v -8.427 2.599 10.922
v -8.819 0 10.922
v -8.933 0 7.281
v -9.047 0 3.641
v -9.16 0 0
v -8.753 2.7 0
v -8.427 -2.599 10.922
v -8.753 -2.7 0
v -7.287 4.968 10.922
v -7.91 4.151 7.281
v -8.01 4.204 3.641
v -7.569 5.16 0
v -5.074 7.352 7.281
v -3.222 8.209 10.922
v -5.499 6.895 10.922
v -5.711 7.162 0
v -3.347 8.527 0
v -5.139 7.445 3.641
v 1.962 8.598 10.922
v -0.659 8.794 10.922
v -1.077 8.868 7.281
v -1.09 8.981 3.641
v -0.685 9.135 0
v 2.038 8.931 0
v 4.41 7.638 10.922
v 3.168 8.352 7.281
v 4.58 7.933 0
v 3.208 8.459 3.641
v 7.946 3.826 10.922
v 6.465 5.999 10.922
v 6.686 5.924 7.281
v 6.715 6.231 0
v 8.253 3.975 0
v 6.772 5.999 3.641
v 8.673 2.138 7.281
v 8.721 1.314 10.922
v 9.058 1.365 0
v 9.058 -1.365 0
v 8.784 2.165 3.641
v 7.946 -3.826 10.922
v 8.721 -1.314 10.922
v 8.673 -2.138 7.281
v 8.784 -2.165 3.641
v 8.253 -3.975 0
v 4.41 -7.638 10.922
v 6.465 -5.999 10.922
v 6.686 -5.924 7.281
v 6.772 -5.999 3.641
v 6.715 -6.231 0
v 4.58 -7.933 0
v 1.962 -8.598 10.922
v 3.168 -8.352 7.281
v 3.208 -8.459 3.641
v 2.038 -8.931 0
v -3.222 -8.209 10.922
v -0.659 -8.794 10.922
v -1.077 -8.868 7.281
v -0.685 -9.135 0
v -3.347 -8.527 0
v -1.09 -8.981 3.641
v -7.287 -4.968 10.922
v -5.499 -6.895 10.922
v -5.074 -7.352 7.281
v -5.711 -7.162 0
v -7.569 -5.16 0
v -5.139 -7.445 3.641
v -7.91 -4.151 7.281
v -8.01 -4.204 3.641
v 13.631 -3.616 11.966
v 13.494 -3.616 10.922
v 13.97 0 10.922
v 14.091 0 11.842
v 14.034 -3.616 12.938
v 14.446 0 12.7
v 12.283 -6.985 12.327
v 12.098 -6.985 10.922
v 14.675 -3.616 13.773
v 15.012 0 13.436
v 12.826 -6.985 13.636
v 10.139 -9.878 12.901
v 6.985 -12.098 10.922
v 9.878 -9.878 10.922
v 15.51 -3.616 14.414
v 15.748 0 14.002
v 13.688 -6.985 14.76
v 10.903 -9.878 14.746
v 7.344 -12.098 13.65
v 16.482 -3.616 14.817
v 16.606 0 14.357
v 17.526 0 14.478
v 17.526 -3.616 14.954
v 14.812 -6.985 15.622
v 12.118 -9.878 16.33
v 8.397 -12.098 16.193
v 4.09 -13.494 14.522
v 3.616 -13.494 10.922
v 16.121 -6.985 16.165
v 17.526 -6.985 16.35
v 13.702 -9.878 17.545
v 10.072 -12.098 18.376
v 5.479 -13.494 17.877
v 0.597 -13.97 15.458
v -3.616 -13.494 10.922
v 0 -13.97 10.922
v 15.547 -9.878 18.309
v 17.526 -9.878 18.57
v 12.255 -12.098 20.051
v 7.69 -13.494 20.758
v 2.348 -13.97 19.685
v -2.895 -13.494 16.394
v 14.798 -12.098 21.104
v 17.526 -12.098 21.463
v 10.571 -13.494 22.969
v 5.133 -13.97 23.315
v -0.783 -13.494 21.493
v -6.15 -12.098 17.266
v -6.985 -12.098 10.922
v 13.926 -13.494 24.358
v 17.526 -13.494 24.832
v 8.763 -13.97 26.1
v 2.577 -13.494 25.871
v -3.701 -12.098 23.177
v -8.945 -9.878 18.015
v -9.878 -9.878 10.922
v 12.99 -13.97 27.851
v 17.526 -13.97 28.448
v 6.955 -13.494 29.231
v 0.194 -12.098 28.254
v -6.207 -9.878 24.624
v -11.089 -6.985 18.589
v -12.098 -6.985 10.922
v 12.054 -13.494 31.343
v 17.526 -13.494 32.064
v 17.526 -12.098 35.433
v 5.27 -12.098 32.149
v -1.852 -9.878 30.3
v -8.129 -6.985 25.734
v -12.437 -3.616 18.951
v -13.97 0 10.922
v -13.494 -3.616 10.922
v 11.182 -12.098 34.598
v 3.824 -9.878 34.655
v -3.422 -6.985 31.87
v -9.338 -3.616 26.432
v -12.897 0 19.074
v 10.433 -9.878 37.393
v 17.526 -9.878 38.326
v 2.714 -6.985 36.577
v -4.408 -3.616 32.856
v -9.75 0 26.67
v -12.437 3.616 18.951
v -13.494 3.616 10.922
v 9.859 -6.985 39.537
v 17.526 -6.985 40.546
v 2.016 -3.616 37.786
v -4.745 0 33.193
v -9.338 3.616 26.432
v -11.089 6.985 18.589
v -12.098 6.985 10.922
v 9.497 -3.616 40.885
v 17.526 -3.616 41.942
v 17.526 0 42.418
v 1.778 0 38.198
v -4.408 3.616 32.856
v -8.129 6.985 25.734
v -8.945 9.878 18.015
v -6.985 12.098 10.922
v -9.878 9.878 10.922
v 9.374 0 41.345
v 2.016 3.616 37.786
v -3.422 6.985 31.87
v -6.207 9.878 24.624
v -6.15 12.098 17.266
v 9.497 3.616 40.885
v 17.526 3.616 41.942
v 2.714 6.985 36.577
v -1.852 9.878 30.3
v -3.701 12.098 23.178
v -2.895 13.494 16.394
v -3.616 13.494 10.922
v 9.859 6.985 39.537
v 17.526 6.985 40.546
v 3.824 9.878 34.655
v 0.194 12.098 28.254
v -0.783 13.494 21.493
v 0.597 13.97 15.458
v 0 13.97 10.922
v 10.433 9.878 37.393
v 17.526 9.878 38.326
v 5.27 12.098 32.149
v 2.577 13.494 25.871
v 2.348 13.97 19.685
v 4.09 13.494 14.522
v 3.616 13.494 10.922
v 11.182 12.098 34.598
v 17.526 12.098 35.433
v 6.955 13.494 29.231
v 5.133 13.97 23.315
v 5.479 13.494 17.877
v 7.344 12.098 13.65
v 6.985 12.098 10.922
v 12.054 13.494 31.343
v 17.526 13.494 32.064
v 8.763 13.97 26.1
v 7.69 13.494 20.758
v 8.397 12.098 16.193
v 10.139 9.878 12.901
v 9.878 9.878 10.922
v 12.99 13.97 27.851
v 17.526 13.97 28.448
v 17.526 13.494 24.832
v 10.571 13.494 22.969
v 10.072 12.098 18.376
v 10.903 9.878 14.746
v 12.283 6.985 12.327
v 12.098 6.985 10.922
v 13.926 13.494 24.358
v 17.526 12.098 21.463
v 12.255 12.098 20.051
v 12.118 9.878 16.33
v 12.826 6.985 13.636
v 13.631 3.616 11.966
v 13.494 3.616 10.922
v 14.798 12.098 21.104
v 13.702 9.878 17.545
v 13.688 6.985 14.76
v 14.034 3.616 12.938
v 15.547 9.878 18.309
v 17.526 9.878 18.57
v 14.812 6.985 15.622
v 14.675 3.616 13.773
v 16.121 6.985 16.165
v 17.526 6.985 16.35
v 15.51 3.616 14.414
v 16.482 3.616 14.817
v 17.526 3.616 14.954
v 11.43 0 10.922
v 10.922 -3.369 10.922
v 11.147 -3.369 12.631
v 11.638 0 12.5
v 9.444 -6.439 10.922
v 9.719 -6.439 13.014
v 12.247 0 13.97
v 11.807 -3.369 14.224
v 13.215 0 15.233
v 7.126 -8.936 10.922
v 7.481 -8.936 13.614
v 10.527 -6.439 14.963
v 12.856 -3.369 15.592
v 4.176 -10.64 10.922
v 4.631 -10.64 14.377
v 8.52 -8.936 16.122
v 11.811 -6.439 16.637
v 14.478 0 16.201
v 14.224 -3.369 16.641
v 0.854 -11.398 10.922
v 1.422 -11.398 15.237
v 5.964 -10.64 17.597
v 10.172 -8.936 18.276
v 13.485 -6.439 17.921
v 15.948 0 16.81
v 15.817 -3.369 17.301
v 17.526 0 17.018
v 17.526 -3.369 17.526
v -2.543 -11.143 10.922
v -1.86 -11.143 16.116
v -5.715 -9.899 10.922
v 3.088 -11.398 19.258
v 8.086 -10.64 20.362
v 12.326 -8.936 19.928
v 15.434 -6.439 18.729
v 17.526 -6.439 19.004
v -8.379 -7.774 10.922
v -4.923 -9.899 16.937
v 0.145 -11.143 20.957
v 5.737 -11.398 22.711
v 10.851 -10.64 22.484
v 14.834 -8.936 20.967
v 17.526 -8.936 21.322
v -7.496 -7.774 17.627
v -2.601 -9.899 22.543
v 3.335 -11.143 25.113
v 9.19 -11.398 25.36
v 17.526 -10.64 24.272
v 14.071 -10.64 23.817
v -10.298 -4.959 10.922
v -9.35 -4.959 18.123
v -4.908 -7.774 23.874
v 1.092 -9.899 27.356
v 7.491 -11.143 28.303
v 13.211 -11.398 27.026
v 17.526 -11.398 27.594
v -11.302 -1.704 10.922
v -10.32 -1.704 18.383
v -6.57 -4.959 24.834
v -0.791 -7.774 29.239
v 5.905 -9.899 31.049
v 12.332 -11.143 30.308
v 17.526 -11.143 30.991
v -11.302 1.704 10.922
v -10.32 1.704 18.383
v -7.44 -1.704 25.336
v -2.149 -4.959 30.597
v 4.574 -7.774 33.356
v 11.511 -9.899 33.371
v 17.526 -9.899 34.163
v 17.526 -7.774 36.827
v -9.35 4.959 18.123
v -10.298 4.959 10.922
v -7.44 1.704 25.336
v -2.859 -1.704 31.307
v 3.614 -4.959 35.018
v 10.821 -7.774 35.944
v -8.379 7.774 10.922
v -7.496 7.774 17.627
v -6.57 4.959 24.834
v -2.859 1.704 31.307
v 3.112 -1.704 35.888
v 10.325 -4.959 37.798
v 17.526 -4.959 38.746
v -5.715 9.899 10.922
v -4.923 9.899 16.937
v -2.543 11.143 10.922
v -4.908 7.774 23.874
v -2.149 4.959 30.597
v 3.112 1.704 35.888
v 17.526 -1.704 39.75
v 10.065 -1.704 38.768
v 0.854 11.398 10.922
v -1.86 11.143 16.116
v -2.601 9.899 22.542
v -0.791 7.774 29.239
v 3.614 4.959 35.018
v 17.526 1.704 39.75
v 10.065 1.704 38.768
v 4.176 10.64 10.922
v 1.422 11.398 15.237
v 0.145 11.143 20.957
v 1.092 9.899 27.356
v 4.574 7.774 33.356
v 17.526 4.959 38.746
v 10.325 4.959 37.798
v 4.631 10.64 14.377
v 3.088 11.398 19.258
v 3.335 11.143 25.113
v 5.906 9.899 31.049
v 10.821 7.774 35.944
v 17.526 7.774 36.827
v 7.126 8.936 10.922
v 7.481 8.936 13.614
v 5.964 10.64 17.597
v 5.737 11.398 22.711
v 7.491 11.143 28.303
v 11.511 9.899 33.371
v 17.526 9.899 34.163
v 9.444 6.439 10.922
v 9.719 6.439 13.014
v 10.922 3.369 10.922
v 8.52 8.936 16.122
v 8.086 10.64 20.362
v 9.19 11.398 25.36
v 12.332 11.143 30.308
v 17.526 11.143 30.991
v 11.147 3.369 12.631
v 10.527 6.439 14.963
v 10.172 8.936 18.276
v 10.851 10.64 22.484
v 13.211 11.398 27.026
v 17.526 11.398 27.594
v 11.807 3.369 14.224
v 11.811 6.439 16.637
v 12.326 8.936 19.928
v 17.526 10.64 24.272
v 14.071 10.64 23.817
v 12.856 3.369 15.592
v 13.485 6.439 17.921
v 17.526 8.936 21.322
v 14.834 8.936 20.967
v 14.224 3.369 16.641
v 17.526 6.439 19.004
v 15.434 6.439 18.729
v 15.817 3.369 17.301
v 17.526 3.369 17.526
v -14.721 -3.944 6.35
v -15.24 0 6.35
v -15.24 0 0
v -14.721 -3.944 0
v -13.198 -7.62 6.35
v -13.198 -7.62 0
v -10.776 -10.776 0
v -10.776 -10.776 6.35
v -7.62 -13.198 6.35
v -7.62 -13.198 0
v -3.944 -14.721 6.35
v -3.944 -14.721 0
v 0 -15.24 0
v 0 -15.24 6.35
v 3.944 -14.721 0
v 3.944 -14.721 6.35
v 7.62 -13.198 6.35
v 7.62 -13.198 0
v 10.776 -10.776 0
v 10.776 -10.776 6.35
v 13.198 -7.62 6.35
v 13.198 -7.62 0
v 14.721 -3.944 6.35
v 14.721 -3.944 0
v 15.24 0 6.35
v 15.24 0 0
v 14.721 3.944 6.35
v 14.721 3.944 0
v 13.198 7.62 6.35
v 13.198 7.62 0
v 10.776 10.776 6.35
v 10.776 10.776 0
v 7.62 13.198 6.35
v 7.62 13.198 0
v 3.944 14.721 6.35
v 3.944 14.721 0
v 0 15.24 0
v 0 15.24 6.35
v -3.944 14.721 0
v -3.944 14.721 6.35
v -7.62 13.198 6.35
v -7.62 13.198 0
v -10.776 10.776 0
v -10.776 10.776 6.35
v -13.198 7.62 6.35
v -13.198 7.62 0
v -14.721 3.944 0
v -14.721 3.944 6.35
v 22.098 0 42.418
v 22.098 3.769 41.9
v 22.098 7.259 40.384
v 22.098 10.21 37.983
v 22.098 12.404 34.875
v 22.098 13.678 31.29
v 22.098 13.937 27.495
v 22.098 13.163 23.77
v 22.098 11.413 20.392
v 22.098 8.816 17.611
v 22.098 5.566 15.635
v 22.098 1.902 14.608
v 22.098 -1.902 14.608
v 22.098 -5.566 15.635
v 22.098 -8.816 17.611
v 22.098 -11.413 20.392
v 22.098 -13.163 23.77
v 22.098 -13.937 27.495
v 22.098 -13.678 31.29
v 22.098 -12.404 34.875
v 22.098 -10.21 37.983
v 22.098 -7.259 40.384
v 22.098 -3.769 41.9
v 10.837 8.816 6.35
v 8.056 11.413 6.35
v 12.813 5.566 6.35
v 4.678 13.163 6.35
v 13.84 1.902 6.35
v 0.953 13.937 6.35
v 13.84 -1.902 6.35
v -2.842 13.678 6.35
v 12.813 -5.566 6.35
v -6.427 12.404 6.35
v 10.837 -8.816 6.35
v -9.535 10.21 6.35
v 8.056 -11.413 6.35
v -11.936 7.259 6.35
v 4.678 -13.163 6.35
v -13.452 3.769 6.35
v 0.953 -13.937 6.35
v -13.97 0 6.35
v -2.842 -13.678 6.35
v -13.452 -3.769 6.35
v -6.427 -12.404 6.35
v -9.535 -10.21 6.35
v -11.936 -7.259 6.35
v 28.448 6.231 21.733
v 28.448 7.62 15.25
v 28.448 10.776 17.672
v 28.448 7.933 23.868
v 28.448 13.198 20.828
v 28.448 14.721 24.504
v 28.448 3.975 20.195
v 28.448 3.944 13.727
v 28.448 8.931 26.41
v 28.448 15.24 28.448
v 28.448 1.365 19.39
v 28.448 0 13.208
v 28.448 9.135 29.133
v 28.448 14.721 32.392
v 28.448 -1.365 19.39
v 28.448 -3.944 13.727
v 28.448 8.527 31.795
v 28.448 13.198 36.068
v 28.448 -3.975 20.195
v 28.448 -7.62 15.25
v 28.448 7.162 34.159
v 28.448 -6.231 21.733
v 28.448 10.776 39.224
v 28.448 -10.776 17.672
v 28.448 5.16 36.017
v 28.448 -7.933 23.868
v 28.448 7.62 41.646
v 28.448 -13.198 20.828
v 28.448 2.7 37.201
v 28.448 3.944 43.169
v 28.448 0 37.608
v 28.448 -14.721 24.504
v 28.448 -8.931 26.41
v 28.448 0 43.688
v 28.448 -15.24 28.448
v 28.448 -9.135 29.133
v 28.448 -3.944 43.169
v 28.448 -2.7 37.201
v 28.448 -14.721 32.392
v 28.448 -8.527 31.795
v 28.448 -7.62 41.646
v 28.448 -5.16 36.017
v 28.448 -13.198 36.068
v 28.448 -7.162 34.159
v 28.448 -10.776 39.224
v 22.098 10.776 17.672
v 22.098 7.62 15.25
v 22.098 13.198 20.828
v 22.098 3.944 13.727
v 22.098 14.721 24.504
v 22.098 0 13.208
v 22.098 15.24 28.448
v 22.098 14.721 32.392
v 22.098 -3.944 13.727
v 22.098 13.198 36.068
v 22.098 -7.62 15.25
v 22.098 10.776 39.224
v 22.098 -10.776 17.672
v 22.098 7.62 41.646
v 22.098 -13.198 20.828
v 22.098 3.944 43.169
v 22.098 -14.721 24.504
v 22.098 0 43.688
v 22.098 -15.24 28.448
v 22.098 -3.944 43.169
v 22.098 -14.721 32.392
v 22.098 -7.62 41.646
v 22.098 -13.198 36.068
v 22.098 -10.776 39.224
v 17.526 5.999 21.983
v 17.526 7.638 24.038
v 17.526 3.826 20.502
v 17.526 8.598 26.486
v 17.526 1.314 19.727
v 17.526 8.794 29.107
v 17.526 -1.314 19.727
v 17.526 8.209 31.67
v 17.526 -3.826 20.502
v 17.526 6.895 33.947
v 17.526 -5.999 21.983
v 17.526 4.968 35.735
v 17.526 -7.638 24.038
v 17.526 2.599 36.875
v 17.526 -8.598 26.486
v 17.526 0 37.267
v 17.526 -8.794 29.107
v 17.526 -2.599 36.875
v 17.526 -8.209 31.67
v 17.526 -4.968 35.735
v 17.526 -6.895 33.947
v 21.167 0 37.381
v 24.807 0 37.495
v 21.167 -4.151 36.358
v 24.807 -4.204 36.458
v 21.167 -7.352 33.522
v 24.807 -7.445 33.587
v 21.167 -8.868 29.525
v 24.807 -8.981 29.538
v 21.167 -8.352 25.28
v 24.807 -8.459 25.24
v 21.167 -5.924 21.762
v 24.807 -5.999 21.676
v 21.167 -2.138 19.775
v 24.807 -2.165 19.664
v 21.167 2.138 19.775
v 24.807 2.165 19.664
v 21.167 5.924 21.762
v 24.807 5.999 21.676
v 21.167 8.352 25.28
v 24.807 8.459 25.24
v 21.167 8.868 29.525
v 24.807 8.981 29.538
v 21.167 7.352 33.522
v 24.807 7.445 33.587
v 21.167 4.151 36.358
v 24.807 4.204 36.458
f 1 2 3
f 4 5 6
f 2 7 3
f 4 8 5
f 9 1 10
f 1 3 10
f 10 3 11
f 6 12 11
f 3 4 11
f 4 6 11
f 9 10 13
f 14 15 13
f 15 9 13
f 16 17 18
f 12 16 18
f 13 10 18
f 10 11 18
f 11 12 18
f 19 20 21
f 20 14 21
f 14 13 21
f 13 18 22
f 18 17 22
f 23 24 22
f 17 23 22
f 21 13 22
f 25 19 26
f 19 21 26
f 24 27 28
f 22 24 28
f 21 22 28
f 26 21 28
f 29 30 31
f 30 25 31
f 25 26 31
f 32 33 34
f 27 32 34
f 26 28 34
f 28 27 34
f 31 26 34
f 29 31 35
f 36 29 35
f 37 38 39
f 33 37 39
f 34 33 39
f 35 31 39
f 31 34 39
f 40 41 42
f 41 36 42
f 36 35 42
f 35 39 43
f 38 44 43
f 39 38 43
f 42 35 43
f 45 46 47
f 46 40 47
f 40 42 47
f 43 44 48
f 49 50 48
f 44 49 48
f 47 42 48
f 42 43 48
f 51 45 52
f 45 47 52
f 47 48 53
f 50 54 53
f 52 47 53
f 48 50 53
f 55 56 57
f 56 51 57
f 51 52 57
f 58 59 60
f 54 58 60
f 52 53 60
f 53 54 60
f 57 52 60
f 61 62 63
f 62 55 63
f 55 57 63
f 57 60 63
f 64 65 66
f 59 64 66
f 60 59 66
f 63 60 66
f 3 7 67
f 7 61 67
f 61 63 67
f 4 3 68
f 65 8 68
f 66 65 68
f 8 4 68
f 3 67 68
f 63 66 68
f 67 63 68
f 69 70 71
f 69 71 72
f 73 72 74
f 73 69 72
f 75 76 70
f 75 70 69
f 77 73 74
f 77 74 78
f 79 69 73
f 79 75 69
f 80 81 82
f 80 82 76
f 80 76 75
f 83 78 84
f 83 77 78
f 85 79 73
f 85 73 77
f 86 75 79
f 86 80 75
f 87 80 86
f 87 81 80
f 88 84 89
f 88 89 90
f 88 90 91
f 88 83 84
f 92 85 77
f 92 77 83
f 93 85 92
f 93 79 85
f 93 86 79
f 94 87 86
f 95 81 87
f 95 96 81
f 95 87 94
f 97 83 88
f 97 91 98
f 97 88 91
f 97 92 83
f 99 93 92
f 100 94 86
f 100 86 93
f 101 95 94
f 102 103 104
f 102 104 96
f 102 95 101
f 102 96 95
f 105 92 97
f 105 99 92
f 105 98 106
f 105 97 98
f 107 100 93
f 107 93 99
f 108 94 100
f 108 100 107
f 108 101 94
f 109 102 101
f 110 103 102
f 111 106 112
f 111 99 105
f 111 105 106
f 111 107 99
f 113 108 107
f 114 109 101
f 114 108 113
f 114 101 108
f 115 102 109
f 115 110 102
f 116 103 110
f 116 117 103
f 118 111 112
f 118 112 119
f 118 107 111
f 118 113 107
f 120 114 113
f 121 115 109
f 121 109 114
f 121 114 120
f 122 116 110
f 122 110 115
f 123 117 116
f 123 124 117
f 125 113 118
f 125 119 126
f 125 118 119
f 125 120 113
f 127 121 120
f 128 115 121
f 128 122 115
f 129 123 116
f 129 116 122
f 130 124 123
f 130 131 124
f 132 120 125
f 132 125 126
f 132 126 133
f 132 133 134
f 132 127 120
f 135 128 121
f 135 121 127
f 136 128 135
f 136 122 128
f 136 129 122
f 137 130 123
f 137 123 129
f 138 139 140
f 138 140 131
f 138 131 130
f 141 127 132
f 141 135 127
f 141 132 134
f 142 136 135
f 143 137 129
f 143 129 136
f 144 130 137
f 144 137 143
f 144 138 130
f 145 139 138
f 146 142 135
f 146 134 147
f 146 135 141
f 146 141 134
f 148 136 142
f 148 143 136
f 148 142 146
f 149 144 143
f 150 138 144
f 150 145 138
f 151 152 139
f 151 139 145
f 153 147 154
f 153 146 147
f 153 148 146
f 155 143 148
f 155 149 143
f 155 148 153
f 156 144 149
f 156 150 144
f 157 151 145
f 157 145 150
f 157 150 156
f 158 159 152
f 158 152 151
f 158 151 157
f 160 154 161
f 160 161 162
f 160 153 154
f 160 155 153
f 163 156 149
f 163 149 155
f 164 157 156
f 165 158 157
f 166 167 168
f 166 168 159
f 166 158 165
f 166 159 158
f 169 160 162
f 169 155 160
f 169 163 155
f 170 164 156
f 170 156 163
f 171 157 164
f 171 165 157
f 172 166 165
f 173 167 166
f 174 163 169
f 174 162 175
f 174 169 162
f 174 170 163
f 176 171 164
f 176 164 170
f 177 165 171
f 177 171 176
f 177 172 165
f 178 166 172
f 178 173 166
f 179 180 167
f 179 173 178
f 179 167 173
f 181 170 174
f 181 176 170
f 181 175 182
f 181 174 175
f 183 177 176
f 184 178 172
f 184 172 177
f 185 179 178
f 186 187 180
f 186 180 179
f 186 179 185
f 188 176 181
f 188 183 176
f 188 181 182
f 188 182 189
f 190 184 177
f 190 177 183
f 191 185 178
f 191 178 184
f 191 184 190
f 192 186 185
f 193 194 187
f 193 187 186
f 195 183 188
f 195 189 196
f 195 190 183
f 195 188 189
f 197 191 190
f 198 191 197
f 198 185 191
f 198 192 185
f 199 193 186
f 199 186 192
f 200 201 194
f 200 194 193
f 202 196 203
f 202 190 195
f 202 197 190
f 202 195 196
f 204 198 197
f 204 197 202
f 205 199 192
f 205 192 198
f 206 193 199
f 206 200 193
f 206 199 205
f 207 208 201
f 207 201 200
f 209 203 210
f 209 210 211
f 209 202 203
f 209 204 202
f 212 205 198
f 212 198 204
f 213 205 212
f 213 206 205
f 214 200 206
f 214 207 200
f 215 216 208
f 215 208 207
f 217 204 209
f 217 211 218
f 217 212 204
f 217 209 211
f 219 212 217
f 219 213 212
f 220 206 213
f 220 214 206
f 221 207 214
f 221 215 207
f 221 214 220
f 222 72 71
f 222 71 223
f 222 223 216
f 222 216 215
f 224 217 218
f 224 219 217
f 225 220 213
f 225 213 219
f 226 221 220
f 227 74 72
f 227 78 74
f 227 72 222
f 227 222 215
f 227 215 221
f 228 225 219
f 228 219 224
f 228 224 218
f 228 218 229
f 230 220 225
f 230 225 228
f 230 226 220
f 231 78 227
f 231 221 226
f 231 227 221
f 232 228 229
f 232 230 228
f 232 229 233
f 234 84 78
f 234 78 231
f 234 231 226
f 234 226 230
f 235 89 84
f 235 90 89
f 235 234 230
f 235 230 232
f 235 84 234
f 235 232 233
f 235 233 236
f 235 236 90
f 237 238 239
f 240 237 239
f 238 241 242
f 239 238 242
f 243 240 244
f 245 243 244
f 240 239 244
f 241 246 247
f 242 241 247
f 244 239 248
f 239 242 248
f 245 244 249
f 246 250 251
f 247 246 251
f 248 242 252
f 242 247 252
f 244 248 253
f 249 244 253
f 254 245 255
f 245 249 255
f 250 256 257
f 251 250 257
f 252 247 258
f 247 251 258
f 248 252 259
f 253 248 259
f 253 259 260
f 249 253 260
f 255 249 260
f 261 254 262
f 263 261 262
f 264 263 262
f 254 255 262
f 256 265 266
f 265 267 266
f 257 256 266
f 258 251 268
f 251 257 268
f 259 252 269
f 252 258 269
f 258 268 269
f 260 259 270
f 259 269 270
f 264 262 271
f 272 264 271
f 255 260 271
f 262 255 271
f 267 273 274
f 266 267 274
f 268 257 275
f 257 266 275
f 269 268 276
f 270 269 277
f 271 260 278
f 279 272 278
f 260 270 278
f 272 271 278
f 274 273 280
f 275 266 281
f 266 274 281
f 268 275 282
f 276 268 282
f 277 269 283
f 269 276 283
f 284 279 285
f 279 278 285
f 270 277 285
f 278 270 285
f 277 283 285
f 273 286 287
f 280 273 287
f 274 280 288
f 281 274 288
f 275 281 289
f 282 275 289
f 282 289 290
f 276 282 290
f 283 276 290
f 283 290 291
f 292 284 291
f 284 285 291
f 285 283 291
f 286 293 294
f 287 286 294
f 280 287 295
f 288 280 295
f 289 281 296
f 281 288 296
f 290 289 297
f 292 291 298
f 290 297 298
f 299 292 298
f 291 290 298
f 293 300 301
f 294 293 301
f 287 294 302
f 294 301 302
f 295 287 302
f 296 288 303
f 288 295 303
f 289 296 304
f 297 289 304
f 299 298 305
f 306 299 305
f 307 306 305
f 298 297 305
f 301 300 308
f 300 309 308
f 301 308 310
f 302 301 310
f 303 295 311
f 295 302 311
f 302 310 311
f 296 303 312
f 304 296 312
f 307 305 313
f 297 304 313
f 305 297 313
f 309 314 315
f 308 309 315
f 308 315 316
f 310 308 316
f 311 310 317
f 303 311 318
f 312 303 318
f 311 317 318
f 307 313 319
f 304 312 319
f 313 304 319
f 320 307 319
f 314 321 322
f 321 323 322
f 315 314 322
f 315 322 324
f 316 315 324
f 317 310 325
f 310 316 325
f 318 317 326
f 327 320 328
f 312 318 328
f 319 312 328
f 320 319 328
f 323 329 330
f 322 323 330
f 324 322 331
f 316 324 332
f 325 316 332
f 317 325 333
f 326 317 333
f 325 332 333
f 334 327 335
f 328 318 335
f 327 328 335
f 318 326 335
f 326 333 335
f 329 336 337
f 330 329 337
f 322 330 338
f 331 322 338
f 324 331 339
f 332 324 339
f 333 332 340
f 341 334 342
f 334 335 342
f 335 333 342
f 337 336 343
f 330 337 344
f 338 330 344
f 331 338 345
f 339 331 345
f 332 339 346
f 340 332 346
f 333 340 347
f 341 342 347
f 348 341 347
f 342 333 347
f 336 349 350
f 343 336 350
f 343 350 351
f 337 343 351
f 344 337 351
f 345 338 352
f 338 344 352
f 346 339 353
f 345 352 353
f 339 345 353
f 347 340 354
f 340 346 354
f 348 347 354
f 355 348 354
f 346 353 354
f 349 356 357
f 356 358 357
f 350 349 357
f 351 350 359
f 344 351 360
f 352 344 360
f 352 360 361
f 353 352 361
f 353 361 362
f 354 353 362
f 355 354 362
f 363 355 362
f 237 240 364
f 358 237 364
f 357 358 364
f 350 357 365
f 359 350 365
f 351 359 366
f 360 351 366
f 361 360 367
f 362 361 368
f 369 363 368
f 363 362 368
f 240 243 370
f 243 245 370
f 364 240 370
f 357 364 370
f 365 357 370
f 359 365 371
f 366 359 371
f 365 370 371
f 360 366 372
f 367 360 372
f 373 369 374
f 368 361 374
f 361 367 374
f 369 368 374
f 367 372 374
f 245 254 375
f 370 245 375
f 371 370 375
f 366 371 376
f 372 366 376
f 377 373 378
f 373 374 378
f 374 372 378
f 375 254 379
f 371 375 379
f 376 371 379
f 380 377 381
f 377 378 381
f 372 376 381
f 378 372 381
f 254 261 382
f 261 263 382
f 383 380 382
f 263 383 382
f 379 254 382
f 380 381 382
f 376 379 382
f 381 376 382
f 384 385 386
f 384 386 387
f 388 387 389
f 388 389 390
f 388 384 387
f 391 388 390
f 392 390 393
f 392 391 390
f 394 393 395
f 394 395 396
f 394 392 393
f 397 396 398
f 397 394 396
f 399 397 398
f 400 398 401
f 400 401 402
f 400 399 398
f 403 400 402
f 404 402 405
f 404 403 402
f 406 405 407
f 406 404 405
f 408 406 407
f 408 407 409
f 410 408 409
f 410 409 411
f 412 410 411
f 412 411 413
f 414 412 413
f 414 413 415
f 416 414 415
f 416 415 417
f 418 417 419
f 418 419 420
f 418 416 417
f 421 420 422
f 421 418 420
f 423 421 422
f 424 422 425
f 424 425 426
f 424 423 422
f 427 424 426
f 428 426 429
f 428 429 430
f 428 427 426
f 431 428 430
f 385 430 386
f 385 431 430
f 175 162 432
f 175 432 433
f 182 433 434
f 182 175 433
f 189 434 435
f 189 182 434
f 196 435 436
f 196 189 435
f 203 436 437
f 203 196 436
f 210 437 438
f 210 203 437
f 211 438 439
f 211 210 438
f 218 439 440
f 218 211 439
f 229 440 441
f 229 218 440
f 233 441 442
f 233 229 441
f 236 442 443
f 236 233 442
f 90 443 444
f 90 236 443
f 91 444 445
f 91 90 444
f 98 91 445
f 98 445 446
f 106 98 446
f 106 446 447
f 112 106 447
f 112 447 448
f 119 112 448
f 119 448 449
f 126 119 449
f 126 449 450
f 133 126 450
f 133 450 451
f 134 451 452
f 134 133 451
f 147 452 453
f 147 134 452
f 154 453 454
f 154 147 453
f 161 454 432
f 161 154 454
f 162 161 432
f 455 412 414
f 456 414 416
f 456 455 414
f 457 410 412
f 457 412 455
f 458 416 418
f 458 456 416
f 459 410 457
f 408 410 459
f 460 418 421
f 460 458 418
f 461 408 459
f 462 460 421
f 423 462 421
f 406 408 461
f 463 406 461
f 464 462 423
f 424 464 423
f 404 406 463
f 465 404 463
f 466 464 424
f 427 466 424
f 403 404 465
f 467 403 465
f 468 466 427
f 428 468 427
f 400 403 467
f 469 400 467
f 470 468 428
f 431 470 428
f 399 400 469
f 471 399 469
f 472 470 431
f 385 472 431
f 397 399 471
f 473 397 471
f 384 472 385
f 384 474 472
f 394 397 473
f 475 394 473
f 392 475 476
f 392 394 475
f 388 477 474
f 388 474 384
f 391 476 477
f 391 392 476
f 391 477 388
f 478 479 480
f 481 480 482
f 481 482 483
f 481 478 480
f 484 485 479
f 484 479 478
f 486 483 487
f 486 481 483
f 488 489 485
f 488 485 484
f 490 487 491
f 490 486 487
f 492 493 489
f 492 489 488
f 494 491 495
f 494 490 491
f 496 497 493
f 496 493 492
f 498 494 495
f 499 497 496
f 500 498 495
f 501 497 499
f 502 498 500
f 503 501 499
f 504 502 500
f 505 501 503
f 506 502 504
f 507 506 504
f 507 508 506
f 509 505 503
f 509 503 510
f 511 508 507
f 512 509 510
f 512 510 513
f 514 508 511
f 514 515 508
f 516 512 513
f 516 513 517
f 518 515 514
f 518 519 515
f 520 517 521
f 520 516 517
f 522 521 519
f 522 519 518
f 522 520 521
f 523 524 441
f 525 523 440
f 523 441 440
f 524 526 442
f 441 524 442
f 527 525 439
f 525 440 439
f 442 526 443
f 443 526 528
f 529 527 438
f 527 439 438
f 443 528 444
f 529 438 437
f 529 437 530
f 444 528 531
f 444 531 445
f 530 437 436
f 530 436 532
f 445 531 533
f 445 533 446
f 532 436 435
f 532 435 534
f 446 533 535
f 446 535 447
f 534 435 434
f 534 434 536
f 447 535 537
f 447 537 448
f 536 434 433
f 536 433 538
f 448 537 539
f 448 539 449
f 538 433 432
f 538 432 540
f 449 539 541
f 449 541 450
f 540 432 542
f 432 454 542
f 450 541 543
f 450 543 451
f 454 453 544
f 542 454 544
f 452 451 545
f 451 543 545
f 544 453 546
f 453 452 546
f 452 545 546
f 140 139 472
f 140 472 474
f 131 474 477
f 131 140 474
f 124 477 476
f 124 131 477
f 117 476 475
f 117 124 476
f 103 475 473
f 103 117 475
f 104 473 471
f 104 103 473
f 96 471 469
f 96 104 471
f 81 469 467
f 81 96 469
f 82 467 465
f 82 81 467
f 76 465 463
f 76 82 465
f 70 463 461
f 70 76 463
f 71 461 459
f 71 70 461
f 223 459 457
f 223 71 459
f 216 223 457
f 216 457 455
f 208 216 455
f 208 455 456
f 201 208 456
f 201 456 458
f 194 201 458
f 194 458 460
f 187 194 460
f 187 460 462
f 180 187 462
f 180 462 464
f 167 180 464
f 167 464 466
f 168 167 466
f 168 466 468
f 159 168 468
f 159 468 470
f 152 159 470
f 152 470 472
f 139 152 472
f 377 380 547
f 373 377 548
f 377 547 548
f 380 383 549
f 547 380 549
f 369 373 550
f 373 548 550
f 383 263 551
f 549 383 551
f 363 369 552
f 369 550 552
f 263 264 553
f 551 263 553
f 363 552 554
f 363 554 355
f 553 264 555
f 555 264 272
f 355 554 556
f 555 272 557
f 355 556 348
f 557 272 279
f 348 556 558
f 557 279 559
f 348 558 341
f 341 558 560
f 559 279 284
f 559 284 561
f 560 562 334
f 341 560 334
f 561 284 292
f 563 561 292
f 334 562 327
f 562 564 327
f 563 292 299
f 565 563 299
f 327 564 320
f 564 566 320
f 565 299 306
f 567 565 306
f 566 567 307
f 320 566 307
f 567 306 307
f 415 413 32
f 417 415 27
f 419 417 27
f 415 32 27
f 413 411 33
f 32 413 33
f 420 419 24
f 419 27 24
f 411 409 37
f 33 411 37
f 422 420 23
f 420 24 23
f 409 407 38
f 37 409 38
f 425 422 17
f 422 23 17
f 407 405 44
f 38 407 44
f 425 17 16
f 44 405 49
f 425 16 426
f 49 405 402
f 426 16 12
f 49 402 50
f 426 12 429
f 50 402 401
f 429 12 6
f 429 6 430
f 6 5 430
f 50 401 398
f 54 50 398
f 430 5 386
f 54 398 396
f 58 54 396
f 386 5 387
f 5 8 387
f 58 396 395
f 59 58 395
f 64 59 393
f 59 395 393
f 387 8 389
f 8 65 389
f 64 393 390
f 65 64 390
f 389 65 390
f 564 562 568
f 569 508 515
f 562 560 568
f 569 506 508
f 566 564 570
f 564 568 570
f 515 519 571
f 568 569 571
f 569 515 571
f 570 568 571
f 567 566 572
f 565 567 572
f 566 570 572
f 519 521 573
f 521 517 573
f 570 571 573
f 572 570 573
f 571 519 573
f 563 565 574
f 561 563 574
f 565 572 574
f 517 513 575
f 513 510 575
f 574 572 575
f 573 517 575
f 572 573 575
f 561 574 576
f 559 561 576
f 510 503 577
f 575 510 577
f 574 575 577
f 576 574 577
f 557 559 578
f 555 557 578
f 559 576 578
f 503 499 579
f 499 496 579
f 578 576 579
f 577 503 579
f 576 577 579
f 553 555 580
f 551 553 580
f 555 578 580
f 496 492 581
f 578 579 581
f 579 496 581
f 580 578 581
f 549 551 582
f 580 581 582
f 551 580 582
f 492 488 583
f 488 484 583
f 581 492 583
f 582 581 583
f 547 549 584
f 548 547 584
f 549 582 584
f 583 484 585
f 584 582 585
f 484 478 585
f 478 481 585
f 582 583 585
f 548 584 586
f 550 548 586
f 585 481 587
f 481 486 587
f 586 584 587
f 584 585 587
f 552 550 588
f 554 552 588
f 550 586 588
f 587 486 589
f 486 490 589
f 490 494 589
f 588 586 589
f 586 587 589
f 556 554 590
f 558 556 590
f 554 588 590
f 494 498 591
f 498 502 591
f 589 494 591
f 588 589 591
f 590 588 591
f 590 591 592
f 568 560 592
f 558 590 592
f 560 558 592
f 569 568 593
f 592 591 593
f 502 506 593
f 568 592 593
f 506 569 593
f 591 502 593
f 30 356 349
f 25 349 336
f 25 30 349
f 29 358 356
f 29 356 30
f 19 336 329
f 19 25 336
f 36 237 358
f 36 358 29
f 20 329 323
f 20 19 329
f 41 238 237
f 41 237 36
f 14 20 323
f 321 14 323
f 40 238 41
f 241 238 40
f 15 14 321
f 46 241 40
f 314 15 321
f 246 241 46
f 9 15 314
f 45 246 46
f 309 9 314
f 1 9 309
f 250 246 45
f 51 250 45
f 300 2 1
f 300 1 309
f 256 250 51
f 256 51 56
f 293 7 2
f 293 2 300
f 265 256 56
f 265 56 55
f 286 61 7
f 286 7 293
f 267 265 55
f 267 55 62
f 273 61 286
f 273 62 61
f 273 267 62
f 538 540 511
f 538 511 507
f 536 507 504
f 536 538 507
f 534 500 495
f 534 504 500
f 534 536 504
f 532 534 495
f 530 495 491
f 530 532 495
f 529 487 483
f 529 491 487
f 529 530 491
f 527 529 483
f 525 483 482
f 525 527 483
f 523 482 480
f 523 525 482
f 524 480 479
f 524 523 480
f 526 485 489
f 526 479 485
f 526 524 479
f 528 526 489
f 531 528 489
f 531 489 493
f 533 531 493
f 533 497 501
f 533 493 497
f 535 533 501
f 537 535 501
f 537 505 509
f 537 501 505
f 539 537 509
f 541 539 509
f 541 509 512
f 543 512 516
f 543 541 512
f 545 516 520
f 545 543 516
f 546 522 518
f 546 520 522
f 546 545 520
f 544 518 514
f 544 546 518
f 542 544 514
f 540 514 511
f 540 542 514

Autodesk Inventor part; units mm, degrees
ref_plane "YZ Plane" through (0, 0, 0) normal (1, 0, 0) x (0, 1, 0)
ref_plane "XZ Plane" through (0, 0, 0) normal (0, 1, 0) x (-1, 0, 0)
ref_plane "XY Plane" through (0, 0, 0) normal (0, 0, 1) x (1, 0, 0)
sketch "Sketch1" plane through (0, 0, 0) normal (0, 1, 0) x (-1, 0, 0)
  line L0 (0, 0) -> (9.1604, 0) construction
  line L1 (9.1604, 0) -> (15.24, 0)
  line L2 (15.24, 0) -> (15.24, 6.35)
  line L3 (15.24, 6.35) -> (13.97, 6.35)
  line L4 (13.97, 6.35) -> (13.97, 10.922)
  line L5 (13.97, 10.922) -> (8.8191, 10.922)
  line L6 (8.8191, 10.922) -> (9.1604, 0)
  line L7 (0, 0) -> (0, 10.922)
  line L8 (0, 10.922) -> (8.8191, 10.922) construction
  line L9 (0, 0) -> (0, 28.448) construction
  line L10 (0, 28.448) -> (-17.526, 28.448) construction
  arc A0 (0, 10.922) -> (-17.526, 28.448) centre (-17.526, 10.922) ccw
  line L11 (-17.526, 28.448) -> (-28.7343, 28.448)
  line L12 (-28.448, 37.6084) -> (-28.448, 43.688)
  line L13 (-28.448, 43.688) -> (-22.098, 43.688)
  line L14 (-17.526, 42.418) -> (-17.526, 37.2671)
  line L15 (-17.526, 37.2671) -> (-17.526, 28.448) construction
  line L16 (-22.098, 43.688) -> (-22.098, 42.418)
  line L17 (-22.098, 42.418) -> (-17.526, 42.418)
  line L18 (-17.526, 37.2671) -> (-28.448, 37.6084)
  line L19 (-28.448, 37.6084) -> (-28.7343, 28.448) construction
  dimension "d0" = 18.3208
  dimension "d1" = 27.94
  dimension "d2" = 30.48
  dimension "d3" = 6.35
  dimension "d4" = 10.922
  dimension "d5" = 1.79
  dimension "d8" = 90
  dimension "d9" = 28.448
  dimension "d10" = 17.526
  dimension "d12" = 1.79
  dimension "d13" = 10.922
  dimension "d14" = 6.35
  dimension "d15" = 18.3208
  dimension "d17" = 27.94
  dimension "d18" = 30.48
revolve "Revolution1" add sketch "Sketch1" angle 360 about axis through (0, 0, 0) along (0, 0, 1) contours L6 L5 L4 L3 L2 L1
sketch "Sketch3" plane through (0, 0, 10.922) normal (0, 0, 1) x (1, 0, 0)
  circle A0 centre (0, 0) radius 11.43
  circle A1 centre (0, 0) radius 13.97
  circle A2 centre (0, 0) radius 13.97 projected
  dimension "d6" = 22.86
  dimension "d7" = 27.94
sweep "Sweep1" add profiles "Sketch3" path "Sketch1" path curves A0
revolve "Revolution2" add sketch "Sketch1" angle 360 about axis through (17.526, 0, 28.448) along (1, 0, 0) contours L12 L13 L16 L17 L14 L18
thread "Thread1"
thread "Thread2"
equation "\"d0\" = MD"
equation "\"d1\" = F1 + 2 * G"
equation "\"d2\" = H"
equation "\"d3\" = E1"
equation "\"d4\" = B"
equation "\"d9\" = A"
equation "\"d10\" = A - B"
equation "\"d13\" = B"
equation "\"d14\" = E1"
equation "\"d15\" = MD"
equation "\"d17\" = F1 + 2 * G"
equation "\"d18\" = H"
equation "\"d6\" = F1"
equation "\"d7\" = F1 + 2 * G"
equation "\"d58\" = B"
equation "\"MD\" = 18.32077"
equation "\"A\" = 28.448"
equation "\"B\" = 10.922"
equation "\"G\" = 2.54"
equation "\"F1\" = 22.86"
equation "\"P\" = 1.8143"
equation "\"H\" = 30.48"
equation "\"E1\" = 6.35"
equation "\"Size_Designation\" = 0.5"
properties part number "ASME B16.3 90 Deg Elbow - Class 150 1/2" material "Iron, Malleable"
